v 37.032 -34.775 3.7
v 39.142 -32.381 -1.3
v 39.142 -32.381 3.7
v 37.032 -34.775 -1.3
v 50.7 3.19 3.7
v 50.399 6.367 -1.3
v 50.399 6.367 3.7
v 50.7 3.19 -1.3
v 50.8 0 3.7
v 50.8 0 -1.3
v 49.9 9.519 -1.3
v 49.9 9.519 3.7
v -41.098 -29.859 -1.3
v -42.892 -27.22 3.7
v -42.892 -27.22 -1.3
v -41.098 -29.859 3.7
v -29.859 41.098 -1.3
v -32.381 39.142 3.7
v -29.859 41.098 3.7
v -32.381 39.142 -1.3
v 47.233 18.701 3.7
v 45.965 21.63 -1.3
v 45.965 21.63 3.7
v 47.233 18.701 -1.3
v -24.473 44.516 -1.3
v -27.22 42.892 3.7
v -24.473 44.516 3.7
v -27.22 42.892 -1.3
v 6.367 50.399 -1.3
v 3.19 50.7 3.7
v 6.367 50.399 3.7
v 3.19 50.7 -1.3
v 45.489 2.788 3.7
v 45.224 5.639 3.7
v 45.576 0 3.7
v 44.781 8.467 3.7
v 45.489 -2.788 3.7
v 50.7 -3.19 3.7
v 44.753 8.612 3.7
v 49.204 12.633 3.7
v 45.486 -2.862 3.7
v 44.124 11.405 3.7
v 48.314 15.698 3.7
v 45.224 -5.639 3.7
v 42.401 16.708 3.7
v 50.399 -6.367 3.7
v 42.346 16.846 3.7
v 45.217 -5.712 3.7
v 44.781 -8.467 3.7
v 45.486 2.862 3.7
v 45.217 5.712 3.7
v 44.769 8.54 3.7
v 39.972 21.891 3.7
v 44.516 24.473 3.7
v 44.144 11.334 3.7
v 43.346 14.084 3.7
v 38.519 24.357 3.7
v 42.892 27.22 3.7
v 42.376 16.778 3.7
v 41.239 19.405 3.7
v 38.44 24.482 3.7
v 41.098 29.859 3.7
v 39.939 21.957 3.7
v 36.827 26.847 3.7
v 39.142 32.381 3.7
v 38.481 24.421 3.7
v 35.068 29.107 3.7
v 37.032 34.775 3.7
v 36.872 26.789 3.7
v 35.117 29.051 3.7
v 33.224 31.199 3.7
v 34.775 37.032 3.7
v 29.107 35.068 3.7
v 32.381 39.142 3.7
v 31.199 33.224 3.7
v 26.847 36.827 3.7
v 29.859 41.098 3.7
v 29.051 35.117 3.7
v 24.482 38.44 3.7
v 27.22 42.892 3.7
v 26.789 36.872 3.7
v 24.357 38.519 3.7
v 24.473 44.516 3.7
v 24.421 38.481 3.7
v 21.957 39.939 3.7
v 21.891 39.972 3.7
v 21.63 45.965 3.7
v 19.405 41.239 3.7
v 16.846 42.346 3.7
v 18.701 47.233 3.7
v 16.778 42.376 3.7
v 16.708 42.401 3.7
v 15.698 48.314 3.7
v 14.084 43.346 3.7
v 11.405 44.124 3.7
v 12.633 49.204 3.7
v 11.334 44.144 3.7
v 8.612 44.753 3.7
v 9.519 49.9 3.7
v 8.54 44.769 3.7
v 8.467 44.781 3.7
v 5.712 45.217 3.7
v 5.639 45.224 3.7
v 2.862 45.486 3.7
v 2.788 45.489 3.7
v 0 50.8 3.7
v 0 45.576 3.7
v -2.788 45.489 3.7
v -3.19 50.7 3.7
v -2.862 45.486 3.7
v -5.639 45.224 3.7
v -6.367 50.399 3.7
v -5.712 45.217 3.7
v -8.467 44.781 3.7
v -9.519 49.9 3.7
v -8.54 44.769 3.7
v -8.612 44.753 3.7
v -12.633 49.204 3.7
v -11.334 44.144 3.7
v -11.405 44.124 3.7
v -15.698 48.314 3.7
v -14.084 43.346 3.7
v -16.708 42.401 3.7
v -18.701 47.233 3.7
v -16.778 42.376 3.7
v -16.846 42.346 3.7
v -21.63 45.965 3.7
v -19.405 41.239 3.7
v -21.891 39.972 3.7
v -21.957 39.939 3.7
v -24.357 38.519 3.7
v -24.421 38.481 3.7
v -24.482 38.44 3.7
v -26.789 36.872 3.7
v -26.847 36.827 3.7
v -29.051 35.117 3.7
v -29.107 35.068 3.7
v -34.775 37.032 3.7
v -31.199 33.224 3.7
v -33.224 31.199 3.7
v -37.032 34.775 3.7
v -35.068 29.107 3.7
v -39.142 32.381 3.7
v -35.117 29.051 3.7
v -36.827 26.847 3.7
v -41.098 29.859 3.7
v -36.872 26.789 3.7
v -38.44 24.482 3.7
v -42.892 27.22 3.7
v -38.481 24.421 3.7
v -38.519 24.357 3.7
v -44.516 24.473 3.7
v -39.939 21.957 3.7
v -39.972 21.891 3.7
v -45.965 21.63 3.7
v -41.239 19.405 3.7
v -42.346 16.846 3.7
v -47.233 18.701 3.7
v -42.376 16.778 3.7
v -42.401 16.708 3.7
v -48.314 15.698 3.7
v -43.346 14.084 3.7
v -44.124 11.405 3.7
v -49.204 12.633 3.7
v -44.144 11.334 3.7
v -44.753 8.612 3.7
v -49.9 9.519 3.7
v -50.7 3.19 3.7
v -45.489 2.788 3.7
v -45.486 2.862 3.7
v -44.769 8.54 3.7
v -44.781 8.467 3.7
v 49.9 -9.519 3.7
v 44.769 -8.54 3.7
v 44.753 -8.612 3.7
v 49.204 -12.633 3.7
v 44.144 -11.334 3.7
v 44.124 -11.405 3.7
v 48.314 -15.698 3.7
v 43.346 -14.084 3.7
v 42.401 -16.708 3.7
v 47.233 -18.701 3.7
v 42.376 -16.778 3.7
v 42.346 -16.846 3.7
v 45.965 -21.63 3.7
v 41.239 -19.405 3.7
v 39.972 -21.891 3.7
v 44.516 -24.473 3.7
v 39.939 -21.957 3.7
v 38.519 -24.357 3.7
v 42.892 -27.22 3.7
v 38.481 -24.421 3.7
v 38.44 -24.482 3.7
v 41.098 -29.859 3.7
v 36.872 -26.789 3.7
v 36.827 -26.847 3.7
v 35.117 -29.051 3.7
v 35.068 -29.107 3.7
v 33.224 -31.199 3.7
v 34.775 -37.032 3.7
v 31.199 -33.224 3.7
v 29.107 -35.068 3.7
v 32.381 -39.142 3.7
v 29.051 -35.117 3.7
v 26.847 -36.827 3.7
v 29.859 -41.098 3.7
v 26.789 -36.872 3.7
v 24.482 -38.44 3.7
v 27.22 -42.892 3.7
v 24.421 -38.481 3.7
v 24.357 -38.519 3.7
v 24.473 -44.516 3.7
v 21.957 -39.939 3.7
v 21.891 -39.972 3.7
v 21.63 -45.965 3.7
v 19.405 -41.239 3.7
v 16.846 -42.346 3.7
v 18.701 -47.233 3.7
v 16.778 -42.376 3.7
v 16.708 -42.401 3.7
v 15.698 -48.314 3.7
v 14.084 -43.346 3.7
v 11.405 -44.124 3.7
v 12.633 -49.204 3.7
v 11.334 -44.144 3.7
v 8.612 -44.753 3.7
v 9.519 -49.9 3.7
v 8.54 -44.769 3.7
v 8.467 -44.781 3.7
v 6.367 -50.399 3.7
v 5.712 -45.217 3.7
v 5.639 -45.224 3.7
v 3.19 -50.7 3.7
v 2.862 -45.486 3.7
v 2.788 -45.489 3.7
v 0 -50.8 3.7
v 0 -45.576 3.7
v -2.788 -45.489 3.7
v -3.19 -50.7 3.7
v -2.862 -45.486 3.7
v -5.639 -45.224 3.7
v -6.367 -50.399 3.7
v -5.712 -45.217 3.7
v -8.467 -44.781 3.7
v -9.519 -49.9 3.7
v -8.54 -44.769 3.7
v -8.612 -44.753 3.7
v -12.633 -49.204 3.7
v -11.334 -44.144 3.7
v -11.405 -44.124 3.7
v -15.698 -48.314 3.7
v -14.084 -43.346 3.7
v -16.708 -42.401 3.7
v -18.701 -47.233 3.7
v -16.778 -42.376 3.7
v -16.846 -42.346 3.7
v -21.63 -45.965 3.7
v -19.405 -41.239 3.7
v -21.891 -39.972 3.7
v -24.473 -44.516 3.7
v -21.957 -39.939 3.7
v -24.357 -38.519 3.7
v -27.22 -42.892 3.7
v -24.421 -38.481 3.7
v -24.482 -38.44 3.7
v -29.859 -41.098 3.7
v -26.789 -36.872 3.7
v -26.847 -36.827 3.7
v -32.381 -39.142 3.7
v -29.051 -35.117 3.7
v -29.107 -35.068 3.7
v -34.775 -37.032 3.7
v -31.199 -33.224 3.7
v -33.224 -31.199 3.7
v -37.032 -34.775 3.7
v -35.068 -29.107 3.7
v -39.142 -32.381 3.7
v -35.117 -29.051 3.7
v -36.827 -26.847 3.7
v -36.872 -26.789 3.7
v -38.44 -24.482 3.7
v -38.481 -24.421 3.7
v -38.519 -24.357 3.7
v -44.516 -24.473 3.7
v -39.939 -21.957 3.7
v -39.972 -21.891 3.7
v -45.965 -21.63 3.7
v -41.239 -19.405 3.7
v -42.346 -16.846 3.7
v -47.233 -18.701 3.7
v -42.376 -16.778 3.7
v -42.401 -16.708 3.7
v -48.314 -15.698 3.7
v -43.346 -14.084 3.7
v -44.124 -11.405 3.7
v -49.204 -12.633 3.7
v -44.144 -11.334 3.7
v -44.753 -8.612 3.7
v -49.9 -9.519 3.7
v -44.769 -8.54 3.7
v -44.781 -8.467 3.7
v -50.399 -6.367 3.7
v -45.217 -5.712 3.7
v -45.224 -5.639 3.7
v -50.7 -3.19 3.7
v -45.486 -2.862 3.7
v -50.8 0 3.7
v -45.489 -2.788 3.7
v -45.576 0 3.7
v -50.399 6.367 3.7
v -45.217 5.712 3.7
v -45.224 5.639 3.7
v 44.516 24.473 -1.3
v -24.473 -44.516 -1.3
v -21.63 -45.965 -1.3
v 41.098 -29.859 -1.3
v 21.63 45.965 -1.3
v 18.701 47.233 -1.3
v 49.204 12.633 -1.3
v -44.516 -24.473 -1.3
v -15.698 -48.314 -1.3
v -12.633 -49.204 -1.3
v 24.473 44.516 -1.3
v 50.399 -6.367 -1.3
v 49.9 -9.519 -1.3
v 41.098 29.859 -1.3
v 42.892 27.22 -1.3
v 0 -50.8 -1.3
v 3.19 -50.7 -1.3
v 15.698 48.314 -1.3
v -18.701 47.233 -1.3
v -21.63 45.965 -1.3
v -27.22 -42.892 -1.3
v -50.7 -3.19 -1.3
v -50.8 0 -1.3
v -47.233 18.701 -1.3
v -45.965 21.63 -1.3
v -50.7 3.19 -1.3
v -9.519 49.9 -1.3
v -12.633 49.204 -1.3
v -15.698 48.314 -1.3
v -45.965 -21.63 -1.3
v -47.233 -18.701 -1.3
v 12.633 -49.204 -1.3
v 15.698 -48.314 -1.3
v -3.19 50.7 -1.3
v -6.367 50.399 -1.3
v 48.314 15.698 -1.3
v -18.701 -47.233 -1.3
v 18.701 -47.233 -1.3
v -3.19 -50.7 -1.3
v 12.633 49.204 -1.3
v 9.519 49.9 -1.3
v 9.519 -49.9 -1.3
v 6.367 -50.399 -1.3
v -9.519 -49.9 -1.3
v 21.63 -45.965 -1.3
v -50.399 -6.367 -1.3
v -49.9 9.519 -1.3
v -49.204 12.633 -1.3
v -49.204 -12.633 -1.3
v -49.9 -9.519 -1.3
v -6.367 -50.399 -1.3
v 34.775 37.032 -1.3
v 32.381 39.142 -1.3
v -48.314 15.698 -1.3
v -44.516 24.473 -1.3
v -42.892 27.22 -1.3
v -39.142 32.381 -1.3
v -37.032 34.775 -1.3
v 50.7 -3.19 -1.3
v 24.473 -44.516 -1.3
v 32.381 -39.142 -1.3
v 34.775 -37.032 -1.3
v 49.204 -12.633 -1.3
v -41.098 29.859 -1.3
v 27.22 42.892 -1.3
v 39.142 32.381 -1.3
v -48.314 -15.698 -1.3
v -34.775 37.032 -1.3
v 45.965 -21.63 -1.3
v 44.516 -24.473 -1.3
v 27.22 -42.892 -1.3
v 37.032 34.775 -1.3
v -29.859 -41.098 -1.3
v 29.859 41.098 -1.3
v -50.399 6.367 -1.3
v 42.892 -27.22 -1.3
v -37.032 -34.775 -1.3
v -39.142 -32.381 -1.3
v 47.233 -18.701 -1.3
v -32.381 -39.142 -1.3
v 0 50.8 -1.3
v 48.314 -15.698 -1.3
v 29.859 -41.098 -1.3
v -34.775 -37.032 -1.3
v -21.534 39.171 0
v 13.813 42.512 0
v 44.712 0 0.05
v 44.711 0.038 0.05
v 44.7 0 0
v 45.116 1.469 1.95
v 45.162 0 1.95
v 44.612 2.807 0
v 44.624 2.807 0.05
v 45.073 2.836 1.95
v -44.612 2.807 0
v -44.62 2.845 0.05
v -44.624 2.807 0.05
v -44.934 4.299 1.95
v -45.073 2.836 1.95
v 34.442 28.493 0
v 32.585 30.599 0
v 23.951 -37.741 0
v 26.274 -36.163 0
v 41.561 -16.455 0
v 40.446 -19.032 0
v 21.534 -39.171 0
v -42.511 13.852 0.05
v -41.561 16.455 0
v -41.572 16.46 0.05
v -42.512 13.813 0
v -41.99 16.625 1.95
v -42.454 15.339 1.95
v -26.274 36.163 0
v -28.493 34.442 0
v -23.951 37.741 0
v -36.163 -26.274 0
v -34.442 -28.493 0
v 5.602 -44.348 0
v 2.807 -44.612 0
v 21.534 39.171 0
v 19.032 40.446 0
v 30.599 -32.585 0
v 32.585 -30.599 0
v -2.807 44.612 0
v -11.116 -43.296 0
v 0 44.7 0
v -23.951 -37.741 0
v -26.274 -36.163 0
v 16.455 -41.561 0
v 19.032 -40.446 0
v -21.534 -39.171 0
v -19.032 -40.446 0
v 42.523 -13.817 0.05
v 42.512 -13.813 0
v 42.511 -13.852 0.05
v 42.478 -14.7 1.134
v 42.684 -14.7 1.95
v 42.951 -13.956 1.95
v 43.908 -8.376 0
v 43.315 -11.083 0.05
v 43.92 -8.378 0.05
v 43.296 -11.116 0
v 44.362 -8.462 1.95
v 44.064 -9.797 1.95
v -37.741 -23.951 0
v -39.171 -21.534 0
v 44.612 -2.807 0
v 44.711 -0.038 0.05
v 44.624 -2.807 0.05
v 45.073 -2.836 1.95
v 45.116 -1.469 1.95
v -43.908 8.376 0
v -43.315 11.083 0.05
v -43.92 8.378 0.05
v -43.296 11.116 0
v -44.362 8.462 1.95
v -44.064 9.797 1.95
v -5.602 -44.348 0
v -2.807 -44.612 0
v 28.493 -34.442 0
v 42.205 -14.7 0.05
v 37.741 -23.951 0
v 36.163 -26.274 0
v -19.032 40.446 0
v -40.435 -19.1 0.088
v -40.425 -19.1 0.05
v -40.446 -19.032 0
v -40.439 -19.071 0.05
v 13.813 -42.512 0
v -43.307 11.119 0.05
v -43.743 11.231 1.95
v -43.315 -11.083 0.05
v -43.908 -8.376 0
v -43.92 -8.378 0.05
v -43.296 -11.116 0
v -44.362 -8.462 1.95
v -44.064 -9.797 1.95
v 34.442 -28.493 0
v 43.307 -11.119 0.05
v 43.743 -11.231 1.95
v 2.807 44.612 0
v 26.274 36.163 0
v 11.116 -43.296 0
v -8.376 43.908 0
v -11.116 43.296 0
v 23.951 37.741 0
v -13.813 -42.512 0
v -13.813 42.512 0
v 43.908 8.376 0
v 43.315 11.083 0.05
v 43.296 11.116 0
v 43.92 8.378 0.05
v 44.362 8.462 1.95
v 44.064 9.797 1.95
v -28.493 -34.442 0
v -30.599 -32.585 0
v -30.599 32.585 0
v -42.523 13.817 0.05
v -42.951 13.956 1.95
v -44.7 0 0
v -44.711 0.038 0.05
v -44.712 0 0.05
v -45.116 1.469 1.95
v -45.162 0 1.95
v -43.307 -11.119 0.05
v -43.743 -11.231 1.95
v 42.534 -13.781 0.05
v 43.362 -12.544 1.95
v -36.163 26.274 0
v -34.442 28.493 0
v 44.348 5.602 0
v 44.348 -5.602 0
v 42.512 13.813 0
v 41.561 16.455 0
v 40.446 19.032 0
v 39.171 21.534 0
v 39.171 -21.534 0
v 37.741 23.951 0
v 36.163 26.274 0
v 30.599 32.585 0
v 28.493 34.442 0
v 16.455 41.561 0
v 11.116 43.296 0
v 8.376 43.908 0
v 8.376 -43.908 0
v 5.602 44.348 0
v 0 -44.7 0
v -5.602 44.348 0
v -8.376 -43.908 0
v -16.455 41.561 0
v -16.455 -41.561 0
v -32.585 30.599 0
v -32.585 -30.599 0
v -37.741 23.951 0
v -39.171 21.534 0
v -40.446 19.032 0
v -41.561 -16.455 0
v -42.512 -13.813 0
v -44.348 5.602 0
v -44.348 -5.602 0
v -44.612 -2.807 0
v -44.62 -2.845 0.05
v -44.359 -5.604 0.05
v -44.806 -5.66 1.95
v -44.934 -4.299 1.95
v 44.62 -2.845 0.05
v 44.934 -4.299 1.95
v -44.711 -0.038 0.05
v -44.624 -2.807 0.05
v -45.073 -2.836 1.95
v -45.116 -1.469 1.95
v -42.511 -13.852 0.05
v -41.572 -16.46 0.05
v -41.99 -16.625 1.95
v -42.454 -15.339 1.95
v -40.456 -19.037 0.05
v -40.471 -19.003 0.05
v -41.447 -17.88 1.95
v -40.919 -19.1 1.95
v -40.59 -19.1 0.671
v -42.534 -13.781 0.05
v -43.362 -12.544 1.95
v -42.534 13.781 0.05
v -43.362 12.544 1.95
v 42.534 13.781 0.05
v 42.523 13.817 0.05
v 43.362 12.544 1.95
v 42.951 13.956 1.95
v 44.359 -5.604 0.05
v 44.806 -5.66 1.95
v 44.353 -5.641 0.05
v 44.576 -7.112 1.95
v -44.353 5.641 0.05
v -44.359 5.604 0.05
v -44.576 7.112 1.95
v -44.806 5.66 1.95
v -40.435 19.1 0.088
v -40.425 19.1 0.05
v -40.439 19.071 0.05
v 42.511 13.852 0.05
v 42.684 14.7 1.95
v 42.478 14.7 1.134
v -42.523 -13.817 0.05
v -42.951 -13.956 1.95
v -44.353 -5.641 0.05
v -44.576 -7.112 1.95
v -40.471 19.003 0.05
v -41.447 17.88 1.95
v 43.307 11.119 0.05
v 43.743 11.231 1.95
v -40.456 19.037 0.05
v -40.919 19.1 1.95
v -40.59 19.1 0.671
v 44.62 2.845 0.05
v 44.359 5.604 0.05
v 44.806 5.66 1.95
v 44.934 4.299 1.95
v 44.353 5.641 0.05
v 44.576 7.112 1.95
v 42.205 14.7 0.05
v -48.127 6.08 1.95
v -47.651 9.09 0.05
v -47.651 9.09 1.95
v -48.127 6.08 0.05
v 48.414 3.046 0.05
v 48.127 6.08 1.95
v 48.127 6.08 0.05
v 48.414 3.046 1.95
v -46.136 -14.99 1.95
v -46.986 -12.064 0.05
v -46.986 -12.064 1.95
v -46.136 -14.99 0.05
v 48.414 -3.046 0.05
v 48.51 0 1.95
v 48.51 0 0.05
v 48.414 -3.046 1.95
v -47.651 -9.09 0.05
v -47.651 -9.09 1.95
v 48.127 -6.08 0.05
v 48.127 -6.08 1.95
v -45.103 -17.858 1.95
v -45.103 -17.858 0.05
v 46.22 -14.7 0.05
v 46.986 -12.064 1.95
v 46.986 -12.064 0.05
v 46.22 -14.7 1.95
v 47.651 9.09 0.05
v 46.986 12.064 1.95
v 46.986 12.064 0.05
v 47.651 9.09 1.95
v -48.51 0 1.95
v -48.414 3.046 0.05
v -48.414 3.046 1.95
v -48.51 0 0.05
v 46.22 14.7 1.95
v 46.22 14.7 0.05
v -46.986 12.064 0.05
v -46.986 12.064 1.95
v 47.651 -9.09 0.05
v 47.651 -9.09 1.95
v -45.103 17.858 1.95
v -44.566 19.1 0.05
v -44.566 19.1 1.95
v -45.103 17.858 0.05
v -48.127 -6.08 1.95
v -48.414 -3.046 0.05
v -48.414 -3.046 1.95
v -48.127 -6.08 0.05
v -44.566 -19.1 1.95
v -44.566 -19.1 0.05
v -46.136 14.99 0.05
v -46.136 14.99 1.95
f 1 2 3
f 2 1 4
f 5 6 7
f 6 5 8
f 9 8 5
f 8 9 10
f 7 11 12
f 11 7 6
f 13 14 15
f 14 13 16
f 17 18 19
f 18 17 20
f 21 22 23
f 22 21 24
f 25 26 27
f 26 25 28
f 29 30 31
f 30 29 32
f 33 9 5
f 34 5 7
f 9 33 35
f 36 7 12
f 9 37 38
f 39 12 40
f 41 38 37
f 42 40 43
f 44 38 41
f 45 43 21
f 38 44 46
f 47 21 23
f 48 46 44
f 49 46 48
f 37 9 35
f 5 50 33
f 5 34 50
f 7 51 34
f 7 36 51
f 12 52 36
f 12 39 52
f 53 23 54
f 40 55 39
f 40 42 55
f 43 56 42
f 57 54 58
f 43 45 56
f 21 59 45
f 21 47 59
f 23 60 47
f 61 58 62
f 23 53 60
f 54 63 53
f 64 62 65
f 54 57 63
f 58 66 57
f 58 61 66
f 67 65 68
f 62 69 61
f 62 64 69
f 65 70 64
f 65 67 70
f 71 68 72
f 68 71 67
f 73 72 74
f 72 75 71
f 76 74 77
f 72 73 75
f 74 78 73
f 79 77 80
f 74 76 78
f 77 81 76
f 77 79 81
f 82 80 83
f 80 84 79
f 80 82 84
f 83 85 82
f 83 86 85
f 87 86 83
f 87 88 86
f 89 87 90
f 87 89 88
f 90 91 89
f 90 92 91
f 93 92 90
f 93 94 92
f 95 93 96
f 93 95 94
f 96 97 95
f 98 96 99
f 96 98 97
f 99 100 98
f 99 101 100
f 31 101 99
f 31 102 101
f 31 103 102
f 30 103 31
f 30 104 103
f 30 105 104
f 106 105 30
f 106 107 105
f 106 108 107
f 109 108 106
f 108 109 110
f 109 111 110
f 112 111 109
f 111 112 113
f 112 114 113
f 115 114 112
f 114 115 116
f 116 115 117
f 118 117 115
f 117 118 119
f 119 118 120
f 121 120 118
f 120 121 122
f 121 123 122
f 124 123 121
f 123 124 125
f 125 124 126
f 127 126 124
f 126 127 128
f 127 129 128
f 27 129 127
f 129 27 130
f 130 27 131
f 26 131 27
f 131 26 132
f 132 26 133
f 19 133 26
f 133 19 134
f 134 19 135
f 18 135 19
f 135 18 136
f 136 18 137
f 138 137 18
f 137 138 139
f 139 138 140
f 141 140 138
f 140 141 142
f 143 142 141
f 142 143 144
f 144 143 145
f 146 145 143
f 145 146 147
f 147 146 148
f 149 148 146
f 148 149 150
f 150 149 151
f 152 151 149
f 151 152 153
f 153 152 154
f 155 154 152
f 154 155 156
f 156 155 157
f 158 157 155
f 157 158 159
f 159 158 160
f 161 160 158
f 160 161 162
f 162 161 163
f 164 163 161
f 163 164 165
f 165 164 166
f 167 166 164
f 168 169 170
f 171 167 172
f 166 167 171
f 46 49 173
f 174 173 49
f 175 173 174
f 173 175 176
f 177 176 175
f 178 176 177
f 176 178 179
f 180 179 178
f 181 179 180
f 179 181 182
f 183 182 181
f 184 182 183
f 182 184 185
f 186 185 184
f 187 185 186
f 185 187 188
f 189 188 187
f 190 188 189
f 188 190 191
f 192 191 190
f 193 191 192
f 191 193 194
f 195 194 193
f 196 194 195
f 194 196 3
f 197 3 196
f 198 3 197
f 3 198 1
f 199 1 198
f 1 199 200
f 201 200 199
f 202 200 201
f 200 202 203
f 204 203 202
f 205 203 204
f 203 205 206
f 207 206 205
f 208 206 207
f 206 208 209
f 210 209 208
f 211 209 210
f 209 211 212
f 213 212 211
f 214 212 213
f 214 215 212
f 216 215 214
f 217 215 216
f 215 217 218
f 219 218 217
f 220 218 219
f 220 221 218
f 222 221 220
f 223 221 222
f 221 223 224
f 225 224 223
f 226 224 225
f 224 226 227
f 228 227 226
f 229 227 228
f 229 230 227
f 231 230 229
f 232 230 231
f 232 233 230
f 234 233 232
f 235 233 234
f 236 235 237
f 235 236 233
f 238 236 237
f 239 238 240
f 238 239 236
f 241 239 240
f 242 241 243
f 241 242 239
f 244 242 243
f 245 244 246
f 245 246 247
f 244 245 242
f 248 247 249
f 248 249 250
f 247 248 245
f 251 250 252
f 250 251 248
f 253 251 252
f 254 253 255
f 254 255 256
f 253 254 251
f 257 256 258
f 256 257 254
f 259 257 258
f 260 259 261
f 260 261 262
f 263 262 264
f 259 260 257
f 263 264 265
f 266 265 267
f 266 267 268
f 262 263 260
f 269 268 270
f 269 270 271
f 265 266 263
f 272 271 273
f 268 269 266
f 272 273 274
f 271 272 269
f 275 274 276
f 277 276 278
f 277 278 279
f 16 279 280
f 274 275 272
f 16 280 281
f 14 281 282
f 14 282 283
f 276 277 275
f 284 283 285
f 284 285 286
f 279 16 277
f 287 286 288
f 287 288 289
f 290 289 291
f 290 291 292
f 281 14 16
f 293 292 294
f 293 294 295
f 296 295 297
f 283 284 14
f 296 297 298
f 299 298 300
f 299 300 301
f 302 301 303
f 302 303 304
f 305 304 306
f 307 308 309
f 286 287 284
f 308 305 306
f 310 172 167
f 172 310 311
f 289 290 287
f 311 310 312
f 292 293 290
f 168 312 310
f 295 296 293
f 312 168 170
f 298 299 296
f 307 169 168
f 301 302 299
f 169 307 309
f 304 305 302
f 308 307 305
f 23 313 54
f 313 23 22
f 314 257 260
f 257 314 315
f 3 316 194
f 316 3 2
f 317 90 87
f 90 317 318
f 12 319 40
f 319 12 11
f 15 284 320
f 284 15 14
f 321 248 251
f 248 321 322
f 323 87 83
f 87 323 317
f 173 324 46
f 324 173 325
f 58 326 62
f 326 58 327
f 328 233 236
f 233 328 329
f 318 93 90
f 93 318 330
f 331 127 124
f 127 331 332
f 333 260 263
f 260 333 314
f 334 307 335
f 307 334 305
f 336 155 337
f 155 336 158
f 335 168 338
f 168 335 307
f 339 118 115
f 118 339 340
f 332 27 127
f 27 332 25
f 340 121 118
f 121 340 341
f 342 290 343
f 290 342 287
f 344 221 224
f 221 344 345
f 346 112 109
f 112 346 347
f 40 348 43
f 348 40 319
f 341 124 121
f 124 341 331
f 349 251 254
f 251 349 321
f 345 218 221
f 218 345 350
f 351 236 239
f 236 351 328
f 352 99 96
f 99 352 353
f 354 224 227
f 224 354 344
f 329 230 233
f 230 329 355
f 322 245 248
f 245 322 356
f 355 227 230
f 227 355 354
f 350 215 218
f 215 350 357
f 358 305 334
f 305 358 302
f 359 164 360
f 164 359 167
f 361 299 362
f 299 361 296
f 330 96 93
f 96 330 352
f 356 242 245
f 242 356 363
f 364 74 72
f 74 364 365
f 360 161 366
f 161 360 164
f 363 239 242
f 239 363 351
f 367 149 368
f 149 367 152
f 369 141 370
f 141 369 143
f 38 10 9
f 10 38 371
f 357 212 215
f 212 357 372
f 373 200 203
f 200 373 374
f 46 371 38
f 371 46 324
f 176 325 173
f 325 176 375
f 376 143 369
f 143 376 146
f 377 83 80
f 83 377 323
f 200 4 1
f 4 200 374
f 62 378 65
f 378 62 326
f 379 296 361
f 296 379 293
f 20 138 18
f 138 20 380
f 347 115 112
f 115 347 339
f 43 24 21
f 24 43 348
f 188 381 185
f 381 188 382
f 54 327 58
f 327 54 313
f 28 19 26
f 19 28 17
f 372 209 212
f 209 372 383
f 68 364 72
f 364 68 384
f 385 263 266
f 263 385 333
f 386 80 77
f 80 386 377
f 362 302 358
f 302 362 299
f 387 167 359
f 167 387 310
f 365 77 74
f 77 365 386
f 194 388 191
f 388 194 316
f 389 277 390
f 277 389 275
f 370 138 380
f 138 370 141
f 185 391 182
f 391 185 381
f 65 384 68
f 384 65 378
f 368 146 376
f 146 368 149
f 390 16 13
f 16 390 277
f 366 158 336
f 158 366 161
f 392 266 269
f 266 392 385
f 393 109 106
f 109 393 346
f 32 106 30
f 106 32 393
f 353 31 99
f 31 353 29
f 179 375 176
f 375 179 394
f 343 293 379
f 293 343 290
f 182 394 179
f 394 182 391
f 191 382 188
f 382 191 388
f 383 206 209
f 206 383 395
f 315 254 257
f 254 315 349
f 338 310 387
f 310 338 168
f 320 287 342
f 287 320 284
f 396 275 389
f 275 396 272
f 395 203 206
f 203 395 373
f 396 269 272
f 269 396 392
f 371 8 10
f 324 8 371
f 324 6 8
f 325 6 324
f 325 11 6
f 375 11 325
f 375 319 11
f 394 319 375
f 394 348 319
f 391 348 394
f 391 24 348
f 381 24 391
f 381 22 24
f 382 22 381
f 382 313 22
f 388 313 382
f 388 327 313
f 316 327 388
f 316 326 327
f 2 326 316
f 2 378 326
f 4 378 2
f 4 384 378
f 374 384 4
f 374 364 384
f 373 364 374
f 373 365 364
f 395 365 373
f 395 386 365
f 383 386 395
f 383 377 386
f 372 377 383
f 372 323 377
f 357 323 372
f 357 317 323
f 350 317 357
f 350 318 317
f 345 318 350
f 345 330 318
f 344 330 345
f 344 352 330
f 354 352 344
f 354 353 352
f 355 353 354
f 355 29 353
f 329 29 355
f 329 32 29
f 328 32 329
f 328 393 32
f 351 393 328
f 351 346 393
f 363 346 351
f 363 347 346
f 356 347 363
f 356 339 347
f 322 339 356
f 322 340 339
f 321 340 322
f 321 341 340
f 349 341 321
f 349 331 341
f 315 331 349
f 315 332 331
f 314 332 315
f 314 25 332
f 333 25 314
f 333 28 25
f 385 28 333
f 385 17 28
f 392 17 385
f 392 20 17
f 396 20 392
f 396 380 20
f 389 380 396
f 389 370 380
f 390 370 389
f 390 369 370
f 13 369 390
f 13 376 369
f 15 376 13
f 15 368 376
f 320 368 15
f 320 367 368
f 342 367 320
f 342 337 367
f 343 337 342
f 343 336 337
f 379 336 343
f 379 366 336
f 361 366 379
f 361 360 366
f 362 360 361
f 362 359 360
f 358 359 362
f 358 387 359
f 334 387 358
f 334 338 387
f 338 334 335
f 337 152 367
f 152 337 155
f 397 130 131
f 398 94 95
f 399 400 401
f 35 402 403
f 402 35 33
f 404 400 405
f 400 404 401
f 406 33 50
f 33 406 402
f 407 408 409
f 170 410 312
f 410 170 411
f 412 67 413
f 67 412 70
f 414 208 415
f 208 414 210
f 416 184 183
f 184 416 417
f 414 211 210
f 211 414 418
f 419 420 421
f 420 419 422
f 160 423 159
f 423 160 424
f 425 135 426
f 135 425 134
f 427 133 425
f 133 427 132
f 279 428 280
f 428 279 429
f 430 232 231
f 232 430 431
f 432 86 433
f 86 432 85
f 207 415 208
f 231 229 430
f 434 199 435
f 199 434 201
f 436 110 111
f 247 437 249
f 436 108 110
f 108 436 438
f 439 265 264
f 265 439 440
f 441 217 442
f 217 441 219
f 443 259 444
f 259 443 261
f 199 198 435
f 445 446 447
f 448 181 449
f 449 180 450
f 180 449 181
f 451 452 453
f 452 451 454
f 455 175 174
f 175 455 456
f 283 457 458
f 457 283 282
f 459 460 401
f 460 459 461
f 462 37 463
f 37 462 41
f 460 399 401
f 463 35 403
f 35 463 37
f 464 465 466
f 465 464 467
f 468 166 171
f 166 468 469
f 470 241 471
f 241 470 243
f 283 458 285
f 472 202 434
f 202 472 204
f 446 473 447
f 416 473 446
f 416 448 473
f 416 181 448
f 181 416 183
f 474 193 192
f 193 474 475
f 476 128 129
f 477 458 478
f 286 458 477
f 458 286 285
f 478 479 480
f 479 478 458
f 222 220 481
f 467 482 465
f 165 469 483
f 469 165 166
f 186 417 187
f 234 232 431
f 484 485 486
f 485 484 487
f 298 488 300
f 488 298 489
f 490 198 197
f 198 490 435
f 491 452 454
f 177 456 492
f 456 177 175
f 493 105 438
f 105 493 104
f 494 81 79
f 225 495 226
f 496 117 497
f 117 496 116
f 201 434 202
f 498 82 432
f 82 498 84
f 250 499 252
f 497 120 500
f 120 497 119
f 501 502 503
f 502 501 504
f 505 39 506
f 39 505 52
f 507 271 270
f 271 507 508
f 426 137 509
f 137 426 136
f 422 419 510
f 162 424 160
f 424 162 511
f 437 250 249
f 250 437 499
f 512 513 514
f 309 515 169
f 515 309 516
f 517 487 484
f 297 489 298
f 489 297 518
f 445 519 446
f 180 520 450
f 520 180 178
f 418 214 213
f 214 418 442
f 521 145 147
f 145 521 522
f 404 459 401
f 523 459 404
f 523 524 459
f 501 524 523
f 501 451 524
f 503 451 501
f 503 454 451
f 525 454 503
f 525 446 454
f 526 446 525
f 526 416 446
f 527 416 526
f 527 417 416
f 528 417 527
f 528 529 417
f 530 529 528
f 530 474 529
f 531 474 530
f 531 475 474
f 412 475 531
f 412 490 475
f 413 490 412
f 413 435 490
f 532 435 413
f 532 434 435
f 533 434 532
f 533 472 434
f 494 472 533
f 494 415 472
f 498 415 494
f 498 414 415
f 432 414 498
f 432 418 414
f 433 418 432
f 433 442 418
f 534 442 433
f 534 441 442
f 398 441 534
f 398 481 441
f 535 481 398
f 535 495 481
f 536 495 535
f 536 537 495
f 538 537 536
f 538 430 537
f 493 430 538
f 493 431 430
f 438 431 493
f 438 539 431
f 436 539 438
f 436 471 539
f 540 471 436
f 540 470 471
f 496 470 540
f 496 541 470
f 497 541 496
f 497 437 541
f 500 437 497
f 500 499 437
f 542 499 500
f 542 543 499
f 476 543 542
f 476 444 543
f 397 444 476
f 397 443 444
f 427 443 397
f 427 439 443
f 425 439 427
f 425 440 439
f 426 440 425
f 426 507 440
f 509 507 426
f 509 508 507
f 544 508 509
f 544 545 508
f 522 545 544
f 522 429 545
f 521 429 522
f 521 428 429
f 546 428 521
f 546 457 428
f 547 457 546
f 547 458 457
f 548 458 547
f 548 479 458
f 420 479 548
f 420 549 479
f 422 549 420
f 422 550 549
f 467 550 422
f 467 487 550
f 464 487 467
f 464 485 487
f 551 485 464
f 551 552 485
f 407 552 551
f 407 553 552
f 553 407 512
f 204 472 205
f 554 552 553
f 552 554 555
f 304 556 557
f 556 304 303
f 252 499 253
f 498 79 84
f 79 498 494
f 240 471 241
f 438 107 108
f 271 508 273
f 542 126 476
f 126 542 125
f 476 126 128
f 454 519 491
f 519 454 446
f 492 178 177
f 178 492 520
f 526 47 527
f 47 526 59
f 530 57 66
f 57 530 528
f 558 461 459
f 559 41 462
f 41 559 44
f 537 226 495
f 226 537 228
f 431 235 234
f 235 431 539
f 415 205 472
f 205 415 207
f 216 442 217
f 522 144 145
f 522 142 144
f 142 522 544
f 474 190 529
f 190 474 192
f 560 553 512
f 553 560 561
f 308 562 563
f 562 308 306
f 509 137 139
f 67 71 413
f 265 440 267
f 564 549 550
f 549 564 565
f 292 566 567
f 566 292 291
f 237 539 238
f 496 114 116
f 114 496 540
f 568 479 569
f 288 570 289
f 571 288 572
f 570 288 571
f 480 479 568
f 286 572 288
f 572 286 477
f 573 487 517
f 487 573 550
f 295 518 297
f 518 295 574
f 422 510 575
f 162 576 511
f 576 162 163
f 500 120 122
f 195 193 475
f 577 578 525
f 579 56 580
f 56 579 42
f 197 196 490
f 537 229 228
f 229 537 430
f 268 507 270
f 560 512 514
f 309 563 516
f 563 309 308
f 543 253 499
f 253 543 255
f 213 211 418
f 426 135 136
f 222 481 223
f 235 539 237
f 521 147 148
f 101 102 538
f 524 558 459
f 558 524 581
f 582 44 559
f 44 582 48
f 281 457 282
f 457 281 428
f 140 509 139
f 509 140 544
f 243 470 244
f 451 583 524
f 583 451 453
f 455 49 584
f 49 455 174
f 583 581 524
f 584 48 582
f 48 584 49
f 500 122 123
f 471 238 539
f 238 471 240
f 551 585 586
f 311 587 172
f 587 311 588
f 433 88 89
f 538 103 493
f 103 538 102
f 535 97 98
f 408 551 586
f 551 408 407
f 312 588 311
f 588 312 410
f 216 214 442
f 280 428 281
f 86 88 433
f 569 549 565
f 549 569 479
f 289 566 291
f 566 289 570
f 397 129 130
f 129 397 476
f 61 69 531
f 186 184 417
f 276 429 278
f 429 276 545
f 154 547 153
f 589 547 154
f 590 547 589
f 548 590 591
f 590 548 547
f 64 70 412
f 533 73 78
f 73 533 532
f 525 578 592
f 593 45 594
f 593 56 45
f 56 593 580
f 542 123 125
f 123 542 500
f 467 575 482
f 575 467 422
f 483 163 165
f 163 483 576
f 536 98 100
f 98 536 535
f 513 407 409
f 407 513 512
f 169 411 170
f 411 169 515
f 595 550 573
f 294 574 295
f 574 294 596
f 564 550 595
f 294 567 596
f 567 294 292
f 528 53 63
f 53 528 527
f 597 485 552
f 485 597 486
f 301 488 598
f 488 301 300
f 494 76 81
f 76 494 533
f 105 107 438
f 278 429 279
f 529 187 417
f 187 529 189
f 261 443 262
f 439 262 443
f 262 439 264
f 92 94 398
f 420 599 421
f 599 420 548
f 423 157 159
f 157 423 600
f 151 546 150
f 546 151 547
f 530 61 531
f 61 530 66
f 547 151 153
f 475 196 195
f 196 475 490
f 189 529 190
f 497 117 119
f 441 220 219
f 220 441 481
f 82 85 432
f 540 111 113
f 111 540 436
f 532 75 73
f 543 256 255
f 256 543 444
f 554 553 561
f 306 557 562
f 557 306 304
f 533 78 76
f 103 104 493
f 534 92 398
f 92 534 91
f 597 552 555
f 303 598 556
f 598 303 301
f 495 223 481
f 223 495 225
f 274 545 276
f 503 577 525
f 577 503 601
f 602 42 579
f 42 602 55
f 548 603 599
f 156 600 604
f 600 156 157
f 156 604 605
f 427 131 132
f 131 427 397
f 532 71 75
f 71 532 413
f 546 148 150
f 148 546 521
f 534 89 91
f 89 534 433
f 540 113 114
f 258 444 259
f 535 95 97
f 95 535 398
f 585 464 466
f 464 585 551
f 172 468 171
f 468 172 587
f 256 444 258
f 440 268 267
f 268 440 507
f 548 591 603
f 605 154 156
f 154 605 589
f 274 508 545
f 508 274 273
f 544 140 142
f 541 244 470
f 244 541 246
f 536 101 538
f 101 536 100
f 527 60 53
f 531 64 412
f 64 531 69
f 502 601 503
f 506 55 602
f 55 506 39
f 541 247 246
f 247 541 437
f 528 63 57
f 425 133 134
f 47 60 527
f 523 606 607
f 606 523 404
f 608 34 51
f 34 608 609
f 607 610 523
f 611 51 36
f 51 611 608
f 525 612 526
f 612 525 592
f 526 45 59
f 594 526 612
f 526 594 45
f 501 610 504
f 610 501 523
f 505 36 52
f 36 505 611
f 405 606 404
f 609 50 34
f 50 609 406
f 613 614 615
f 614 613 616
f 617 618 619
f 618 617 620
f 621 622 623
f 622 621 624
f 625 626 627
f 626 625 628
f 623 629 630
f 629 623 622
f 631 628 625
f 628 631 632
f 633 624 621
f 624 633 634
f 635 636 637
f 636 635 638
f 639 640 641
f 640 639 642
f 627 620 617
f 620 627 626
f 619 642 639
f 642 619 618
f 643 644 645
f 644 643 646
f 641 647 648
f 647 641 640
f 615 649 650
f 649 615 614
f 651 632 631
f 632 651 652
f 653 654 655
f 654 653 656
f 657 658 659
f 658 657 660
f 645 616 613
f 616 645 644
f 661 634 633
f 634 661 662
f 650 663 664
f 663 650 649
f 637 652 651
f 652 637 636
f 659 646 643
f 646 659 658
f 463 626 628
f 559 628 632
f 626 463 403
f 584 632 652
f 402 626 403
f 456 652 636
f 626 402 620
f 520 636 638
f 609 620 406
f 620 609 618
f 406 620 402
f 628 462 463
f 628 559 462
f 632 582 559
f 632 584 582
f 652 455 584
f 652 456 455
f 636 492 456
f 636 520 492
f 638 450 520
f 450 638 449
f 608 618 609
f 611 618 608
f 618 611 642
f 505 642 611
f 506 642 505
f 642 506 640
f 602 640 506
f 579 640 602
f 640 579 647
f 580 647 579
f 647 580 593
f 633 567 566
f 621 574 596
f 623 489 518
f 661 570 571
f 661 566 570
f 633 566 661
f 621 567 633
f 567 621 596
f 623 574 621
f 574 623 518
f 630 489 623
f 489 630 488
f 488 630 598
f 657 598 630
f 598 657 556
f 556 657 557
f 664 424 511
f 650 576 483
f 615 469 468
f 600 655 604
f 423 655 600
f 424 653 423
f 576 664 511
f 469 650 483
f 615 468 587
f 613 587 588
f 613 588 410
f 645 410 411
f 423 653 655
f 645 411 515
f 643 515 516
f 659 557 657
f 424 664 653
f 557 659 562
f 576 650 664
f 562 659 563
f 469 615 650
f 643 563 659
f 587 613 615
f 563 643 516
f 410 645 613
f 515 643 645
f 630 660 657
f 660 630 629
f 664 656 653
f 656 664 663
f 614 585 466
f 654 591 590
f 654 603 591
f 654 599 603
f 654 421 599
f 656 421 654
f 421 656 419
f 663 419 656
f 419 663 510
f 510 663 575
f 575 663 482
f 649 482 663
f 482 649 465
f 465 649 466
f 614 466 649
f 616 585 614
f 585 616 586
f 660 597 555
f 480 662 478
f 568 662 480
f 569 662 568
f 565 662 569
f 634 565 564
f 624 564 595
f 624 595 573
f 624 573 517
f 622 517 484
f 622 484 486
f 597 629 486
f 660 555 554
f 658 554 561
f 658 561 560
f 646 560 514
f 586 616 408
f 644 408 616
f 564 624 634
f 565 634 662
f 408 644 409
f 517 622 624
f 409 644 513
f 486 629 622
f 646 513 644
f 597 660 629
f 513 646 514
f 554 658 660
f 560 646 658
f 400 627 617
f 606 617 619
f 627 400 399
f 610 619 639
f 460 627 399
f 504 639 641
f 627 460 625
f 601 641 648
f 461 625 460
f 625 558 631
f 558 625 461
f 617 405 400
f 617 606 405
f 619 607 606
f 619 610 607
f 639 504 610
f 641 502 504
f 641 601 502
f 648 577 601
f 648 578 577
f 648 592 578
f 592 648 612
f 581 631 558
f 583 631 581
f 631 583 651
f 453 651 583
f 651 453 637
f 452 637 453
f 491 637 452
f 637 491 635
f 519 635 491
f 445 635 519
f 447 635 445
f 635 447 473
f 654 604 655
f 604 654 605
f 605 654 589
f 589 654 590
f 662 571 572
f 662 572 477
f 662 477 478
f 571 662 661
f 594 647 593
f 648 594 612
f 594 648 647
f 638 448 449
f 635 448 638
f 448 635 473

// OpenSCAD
$fn=100;
difference() {
	difference() {
		translate([0,0,-1.3]) cylinder(r=50.8, h=5);
		// disk on the windshield end
		cylinder(r2=45.6, r1=44.7, h=3.8);
	}


	translate([0,0,1]) difference() {
		cylinder(r=48.51, h=1.9, center=true);
		// .750"
		translate([0,25+19.1,0]) cube([100,50,2], center=true);
		translate([0,-25-19.1,0]) cube([100,50,2], center=true);
		// .580"
		translate([50,25+14.7,0]) cube([100,50,2], center=true);
		translate([50,-25-14.7,0]) cube([100,50,2], center=true);
	}
}
